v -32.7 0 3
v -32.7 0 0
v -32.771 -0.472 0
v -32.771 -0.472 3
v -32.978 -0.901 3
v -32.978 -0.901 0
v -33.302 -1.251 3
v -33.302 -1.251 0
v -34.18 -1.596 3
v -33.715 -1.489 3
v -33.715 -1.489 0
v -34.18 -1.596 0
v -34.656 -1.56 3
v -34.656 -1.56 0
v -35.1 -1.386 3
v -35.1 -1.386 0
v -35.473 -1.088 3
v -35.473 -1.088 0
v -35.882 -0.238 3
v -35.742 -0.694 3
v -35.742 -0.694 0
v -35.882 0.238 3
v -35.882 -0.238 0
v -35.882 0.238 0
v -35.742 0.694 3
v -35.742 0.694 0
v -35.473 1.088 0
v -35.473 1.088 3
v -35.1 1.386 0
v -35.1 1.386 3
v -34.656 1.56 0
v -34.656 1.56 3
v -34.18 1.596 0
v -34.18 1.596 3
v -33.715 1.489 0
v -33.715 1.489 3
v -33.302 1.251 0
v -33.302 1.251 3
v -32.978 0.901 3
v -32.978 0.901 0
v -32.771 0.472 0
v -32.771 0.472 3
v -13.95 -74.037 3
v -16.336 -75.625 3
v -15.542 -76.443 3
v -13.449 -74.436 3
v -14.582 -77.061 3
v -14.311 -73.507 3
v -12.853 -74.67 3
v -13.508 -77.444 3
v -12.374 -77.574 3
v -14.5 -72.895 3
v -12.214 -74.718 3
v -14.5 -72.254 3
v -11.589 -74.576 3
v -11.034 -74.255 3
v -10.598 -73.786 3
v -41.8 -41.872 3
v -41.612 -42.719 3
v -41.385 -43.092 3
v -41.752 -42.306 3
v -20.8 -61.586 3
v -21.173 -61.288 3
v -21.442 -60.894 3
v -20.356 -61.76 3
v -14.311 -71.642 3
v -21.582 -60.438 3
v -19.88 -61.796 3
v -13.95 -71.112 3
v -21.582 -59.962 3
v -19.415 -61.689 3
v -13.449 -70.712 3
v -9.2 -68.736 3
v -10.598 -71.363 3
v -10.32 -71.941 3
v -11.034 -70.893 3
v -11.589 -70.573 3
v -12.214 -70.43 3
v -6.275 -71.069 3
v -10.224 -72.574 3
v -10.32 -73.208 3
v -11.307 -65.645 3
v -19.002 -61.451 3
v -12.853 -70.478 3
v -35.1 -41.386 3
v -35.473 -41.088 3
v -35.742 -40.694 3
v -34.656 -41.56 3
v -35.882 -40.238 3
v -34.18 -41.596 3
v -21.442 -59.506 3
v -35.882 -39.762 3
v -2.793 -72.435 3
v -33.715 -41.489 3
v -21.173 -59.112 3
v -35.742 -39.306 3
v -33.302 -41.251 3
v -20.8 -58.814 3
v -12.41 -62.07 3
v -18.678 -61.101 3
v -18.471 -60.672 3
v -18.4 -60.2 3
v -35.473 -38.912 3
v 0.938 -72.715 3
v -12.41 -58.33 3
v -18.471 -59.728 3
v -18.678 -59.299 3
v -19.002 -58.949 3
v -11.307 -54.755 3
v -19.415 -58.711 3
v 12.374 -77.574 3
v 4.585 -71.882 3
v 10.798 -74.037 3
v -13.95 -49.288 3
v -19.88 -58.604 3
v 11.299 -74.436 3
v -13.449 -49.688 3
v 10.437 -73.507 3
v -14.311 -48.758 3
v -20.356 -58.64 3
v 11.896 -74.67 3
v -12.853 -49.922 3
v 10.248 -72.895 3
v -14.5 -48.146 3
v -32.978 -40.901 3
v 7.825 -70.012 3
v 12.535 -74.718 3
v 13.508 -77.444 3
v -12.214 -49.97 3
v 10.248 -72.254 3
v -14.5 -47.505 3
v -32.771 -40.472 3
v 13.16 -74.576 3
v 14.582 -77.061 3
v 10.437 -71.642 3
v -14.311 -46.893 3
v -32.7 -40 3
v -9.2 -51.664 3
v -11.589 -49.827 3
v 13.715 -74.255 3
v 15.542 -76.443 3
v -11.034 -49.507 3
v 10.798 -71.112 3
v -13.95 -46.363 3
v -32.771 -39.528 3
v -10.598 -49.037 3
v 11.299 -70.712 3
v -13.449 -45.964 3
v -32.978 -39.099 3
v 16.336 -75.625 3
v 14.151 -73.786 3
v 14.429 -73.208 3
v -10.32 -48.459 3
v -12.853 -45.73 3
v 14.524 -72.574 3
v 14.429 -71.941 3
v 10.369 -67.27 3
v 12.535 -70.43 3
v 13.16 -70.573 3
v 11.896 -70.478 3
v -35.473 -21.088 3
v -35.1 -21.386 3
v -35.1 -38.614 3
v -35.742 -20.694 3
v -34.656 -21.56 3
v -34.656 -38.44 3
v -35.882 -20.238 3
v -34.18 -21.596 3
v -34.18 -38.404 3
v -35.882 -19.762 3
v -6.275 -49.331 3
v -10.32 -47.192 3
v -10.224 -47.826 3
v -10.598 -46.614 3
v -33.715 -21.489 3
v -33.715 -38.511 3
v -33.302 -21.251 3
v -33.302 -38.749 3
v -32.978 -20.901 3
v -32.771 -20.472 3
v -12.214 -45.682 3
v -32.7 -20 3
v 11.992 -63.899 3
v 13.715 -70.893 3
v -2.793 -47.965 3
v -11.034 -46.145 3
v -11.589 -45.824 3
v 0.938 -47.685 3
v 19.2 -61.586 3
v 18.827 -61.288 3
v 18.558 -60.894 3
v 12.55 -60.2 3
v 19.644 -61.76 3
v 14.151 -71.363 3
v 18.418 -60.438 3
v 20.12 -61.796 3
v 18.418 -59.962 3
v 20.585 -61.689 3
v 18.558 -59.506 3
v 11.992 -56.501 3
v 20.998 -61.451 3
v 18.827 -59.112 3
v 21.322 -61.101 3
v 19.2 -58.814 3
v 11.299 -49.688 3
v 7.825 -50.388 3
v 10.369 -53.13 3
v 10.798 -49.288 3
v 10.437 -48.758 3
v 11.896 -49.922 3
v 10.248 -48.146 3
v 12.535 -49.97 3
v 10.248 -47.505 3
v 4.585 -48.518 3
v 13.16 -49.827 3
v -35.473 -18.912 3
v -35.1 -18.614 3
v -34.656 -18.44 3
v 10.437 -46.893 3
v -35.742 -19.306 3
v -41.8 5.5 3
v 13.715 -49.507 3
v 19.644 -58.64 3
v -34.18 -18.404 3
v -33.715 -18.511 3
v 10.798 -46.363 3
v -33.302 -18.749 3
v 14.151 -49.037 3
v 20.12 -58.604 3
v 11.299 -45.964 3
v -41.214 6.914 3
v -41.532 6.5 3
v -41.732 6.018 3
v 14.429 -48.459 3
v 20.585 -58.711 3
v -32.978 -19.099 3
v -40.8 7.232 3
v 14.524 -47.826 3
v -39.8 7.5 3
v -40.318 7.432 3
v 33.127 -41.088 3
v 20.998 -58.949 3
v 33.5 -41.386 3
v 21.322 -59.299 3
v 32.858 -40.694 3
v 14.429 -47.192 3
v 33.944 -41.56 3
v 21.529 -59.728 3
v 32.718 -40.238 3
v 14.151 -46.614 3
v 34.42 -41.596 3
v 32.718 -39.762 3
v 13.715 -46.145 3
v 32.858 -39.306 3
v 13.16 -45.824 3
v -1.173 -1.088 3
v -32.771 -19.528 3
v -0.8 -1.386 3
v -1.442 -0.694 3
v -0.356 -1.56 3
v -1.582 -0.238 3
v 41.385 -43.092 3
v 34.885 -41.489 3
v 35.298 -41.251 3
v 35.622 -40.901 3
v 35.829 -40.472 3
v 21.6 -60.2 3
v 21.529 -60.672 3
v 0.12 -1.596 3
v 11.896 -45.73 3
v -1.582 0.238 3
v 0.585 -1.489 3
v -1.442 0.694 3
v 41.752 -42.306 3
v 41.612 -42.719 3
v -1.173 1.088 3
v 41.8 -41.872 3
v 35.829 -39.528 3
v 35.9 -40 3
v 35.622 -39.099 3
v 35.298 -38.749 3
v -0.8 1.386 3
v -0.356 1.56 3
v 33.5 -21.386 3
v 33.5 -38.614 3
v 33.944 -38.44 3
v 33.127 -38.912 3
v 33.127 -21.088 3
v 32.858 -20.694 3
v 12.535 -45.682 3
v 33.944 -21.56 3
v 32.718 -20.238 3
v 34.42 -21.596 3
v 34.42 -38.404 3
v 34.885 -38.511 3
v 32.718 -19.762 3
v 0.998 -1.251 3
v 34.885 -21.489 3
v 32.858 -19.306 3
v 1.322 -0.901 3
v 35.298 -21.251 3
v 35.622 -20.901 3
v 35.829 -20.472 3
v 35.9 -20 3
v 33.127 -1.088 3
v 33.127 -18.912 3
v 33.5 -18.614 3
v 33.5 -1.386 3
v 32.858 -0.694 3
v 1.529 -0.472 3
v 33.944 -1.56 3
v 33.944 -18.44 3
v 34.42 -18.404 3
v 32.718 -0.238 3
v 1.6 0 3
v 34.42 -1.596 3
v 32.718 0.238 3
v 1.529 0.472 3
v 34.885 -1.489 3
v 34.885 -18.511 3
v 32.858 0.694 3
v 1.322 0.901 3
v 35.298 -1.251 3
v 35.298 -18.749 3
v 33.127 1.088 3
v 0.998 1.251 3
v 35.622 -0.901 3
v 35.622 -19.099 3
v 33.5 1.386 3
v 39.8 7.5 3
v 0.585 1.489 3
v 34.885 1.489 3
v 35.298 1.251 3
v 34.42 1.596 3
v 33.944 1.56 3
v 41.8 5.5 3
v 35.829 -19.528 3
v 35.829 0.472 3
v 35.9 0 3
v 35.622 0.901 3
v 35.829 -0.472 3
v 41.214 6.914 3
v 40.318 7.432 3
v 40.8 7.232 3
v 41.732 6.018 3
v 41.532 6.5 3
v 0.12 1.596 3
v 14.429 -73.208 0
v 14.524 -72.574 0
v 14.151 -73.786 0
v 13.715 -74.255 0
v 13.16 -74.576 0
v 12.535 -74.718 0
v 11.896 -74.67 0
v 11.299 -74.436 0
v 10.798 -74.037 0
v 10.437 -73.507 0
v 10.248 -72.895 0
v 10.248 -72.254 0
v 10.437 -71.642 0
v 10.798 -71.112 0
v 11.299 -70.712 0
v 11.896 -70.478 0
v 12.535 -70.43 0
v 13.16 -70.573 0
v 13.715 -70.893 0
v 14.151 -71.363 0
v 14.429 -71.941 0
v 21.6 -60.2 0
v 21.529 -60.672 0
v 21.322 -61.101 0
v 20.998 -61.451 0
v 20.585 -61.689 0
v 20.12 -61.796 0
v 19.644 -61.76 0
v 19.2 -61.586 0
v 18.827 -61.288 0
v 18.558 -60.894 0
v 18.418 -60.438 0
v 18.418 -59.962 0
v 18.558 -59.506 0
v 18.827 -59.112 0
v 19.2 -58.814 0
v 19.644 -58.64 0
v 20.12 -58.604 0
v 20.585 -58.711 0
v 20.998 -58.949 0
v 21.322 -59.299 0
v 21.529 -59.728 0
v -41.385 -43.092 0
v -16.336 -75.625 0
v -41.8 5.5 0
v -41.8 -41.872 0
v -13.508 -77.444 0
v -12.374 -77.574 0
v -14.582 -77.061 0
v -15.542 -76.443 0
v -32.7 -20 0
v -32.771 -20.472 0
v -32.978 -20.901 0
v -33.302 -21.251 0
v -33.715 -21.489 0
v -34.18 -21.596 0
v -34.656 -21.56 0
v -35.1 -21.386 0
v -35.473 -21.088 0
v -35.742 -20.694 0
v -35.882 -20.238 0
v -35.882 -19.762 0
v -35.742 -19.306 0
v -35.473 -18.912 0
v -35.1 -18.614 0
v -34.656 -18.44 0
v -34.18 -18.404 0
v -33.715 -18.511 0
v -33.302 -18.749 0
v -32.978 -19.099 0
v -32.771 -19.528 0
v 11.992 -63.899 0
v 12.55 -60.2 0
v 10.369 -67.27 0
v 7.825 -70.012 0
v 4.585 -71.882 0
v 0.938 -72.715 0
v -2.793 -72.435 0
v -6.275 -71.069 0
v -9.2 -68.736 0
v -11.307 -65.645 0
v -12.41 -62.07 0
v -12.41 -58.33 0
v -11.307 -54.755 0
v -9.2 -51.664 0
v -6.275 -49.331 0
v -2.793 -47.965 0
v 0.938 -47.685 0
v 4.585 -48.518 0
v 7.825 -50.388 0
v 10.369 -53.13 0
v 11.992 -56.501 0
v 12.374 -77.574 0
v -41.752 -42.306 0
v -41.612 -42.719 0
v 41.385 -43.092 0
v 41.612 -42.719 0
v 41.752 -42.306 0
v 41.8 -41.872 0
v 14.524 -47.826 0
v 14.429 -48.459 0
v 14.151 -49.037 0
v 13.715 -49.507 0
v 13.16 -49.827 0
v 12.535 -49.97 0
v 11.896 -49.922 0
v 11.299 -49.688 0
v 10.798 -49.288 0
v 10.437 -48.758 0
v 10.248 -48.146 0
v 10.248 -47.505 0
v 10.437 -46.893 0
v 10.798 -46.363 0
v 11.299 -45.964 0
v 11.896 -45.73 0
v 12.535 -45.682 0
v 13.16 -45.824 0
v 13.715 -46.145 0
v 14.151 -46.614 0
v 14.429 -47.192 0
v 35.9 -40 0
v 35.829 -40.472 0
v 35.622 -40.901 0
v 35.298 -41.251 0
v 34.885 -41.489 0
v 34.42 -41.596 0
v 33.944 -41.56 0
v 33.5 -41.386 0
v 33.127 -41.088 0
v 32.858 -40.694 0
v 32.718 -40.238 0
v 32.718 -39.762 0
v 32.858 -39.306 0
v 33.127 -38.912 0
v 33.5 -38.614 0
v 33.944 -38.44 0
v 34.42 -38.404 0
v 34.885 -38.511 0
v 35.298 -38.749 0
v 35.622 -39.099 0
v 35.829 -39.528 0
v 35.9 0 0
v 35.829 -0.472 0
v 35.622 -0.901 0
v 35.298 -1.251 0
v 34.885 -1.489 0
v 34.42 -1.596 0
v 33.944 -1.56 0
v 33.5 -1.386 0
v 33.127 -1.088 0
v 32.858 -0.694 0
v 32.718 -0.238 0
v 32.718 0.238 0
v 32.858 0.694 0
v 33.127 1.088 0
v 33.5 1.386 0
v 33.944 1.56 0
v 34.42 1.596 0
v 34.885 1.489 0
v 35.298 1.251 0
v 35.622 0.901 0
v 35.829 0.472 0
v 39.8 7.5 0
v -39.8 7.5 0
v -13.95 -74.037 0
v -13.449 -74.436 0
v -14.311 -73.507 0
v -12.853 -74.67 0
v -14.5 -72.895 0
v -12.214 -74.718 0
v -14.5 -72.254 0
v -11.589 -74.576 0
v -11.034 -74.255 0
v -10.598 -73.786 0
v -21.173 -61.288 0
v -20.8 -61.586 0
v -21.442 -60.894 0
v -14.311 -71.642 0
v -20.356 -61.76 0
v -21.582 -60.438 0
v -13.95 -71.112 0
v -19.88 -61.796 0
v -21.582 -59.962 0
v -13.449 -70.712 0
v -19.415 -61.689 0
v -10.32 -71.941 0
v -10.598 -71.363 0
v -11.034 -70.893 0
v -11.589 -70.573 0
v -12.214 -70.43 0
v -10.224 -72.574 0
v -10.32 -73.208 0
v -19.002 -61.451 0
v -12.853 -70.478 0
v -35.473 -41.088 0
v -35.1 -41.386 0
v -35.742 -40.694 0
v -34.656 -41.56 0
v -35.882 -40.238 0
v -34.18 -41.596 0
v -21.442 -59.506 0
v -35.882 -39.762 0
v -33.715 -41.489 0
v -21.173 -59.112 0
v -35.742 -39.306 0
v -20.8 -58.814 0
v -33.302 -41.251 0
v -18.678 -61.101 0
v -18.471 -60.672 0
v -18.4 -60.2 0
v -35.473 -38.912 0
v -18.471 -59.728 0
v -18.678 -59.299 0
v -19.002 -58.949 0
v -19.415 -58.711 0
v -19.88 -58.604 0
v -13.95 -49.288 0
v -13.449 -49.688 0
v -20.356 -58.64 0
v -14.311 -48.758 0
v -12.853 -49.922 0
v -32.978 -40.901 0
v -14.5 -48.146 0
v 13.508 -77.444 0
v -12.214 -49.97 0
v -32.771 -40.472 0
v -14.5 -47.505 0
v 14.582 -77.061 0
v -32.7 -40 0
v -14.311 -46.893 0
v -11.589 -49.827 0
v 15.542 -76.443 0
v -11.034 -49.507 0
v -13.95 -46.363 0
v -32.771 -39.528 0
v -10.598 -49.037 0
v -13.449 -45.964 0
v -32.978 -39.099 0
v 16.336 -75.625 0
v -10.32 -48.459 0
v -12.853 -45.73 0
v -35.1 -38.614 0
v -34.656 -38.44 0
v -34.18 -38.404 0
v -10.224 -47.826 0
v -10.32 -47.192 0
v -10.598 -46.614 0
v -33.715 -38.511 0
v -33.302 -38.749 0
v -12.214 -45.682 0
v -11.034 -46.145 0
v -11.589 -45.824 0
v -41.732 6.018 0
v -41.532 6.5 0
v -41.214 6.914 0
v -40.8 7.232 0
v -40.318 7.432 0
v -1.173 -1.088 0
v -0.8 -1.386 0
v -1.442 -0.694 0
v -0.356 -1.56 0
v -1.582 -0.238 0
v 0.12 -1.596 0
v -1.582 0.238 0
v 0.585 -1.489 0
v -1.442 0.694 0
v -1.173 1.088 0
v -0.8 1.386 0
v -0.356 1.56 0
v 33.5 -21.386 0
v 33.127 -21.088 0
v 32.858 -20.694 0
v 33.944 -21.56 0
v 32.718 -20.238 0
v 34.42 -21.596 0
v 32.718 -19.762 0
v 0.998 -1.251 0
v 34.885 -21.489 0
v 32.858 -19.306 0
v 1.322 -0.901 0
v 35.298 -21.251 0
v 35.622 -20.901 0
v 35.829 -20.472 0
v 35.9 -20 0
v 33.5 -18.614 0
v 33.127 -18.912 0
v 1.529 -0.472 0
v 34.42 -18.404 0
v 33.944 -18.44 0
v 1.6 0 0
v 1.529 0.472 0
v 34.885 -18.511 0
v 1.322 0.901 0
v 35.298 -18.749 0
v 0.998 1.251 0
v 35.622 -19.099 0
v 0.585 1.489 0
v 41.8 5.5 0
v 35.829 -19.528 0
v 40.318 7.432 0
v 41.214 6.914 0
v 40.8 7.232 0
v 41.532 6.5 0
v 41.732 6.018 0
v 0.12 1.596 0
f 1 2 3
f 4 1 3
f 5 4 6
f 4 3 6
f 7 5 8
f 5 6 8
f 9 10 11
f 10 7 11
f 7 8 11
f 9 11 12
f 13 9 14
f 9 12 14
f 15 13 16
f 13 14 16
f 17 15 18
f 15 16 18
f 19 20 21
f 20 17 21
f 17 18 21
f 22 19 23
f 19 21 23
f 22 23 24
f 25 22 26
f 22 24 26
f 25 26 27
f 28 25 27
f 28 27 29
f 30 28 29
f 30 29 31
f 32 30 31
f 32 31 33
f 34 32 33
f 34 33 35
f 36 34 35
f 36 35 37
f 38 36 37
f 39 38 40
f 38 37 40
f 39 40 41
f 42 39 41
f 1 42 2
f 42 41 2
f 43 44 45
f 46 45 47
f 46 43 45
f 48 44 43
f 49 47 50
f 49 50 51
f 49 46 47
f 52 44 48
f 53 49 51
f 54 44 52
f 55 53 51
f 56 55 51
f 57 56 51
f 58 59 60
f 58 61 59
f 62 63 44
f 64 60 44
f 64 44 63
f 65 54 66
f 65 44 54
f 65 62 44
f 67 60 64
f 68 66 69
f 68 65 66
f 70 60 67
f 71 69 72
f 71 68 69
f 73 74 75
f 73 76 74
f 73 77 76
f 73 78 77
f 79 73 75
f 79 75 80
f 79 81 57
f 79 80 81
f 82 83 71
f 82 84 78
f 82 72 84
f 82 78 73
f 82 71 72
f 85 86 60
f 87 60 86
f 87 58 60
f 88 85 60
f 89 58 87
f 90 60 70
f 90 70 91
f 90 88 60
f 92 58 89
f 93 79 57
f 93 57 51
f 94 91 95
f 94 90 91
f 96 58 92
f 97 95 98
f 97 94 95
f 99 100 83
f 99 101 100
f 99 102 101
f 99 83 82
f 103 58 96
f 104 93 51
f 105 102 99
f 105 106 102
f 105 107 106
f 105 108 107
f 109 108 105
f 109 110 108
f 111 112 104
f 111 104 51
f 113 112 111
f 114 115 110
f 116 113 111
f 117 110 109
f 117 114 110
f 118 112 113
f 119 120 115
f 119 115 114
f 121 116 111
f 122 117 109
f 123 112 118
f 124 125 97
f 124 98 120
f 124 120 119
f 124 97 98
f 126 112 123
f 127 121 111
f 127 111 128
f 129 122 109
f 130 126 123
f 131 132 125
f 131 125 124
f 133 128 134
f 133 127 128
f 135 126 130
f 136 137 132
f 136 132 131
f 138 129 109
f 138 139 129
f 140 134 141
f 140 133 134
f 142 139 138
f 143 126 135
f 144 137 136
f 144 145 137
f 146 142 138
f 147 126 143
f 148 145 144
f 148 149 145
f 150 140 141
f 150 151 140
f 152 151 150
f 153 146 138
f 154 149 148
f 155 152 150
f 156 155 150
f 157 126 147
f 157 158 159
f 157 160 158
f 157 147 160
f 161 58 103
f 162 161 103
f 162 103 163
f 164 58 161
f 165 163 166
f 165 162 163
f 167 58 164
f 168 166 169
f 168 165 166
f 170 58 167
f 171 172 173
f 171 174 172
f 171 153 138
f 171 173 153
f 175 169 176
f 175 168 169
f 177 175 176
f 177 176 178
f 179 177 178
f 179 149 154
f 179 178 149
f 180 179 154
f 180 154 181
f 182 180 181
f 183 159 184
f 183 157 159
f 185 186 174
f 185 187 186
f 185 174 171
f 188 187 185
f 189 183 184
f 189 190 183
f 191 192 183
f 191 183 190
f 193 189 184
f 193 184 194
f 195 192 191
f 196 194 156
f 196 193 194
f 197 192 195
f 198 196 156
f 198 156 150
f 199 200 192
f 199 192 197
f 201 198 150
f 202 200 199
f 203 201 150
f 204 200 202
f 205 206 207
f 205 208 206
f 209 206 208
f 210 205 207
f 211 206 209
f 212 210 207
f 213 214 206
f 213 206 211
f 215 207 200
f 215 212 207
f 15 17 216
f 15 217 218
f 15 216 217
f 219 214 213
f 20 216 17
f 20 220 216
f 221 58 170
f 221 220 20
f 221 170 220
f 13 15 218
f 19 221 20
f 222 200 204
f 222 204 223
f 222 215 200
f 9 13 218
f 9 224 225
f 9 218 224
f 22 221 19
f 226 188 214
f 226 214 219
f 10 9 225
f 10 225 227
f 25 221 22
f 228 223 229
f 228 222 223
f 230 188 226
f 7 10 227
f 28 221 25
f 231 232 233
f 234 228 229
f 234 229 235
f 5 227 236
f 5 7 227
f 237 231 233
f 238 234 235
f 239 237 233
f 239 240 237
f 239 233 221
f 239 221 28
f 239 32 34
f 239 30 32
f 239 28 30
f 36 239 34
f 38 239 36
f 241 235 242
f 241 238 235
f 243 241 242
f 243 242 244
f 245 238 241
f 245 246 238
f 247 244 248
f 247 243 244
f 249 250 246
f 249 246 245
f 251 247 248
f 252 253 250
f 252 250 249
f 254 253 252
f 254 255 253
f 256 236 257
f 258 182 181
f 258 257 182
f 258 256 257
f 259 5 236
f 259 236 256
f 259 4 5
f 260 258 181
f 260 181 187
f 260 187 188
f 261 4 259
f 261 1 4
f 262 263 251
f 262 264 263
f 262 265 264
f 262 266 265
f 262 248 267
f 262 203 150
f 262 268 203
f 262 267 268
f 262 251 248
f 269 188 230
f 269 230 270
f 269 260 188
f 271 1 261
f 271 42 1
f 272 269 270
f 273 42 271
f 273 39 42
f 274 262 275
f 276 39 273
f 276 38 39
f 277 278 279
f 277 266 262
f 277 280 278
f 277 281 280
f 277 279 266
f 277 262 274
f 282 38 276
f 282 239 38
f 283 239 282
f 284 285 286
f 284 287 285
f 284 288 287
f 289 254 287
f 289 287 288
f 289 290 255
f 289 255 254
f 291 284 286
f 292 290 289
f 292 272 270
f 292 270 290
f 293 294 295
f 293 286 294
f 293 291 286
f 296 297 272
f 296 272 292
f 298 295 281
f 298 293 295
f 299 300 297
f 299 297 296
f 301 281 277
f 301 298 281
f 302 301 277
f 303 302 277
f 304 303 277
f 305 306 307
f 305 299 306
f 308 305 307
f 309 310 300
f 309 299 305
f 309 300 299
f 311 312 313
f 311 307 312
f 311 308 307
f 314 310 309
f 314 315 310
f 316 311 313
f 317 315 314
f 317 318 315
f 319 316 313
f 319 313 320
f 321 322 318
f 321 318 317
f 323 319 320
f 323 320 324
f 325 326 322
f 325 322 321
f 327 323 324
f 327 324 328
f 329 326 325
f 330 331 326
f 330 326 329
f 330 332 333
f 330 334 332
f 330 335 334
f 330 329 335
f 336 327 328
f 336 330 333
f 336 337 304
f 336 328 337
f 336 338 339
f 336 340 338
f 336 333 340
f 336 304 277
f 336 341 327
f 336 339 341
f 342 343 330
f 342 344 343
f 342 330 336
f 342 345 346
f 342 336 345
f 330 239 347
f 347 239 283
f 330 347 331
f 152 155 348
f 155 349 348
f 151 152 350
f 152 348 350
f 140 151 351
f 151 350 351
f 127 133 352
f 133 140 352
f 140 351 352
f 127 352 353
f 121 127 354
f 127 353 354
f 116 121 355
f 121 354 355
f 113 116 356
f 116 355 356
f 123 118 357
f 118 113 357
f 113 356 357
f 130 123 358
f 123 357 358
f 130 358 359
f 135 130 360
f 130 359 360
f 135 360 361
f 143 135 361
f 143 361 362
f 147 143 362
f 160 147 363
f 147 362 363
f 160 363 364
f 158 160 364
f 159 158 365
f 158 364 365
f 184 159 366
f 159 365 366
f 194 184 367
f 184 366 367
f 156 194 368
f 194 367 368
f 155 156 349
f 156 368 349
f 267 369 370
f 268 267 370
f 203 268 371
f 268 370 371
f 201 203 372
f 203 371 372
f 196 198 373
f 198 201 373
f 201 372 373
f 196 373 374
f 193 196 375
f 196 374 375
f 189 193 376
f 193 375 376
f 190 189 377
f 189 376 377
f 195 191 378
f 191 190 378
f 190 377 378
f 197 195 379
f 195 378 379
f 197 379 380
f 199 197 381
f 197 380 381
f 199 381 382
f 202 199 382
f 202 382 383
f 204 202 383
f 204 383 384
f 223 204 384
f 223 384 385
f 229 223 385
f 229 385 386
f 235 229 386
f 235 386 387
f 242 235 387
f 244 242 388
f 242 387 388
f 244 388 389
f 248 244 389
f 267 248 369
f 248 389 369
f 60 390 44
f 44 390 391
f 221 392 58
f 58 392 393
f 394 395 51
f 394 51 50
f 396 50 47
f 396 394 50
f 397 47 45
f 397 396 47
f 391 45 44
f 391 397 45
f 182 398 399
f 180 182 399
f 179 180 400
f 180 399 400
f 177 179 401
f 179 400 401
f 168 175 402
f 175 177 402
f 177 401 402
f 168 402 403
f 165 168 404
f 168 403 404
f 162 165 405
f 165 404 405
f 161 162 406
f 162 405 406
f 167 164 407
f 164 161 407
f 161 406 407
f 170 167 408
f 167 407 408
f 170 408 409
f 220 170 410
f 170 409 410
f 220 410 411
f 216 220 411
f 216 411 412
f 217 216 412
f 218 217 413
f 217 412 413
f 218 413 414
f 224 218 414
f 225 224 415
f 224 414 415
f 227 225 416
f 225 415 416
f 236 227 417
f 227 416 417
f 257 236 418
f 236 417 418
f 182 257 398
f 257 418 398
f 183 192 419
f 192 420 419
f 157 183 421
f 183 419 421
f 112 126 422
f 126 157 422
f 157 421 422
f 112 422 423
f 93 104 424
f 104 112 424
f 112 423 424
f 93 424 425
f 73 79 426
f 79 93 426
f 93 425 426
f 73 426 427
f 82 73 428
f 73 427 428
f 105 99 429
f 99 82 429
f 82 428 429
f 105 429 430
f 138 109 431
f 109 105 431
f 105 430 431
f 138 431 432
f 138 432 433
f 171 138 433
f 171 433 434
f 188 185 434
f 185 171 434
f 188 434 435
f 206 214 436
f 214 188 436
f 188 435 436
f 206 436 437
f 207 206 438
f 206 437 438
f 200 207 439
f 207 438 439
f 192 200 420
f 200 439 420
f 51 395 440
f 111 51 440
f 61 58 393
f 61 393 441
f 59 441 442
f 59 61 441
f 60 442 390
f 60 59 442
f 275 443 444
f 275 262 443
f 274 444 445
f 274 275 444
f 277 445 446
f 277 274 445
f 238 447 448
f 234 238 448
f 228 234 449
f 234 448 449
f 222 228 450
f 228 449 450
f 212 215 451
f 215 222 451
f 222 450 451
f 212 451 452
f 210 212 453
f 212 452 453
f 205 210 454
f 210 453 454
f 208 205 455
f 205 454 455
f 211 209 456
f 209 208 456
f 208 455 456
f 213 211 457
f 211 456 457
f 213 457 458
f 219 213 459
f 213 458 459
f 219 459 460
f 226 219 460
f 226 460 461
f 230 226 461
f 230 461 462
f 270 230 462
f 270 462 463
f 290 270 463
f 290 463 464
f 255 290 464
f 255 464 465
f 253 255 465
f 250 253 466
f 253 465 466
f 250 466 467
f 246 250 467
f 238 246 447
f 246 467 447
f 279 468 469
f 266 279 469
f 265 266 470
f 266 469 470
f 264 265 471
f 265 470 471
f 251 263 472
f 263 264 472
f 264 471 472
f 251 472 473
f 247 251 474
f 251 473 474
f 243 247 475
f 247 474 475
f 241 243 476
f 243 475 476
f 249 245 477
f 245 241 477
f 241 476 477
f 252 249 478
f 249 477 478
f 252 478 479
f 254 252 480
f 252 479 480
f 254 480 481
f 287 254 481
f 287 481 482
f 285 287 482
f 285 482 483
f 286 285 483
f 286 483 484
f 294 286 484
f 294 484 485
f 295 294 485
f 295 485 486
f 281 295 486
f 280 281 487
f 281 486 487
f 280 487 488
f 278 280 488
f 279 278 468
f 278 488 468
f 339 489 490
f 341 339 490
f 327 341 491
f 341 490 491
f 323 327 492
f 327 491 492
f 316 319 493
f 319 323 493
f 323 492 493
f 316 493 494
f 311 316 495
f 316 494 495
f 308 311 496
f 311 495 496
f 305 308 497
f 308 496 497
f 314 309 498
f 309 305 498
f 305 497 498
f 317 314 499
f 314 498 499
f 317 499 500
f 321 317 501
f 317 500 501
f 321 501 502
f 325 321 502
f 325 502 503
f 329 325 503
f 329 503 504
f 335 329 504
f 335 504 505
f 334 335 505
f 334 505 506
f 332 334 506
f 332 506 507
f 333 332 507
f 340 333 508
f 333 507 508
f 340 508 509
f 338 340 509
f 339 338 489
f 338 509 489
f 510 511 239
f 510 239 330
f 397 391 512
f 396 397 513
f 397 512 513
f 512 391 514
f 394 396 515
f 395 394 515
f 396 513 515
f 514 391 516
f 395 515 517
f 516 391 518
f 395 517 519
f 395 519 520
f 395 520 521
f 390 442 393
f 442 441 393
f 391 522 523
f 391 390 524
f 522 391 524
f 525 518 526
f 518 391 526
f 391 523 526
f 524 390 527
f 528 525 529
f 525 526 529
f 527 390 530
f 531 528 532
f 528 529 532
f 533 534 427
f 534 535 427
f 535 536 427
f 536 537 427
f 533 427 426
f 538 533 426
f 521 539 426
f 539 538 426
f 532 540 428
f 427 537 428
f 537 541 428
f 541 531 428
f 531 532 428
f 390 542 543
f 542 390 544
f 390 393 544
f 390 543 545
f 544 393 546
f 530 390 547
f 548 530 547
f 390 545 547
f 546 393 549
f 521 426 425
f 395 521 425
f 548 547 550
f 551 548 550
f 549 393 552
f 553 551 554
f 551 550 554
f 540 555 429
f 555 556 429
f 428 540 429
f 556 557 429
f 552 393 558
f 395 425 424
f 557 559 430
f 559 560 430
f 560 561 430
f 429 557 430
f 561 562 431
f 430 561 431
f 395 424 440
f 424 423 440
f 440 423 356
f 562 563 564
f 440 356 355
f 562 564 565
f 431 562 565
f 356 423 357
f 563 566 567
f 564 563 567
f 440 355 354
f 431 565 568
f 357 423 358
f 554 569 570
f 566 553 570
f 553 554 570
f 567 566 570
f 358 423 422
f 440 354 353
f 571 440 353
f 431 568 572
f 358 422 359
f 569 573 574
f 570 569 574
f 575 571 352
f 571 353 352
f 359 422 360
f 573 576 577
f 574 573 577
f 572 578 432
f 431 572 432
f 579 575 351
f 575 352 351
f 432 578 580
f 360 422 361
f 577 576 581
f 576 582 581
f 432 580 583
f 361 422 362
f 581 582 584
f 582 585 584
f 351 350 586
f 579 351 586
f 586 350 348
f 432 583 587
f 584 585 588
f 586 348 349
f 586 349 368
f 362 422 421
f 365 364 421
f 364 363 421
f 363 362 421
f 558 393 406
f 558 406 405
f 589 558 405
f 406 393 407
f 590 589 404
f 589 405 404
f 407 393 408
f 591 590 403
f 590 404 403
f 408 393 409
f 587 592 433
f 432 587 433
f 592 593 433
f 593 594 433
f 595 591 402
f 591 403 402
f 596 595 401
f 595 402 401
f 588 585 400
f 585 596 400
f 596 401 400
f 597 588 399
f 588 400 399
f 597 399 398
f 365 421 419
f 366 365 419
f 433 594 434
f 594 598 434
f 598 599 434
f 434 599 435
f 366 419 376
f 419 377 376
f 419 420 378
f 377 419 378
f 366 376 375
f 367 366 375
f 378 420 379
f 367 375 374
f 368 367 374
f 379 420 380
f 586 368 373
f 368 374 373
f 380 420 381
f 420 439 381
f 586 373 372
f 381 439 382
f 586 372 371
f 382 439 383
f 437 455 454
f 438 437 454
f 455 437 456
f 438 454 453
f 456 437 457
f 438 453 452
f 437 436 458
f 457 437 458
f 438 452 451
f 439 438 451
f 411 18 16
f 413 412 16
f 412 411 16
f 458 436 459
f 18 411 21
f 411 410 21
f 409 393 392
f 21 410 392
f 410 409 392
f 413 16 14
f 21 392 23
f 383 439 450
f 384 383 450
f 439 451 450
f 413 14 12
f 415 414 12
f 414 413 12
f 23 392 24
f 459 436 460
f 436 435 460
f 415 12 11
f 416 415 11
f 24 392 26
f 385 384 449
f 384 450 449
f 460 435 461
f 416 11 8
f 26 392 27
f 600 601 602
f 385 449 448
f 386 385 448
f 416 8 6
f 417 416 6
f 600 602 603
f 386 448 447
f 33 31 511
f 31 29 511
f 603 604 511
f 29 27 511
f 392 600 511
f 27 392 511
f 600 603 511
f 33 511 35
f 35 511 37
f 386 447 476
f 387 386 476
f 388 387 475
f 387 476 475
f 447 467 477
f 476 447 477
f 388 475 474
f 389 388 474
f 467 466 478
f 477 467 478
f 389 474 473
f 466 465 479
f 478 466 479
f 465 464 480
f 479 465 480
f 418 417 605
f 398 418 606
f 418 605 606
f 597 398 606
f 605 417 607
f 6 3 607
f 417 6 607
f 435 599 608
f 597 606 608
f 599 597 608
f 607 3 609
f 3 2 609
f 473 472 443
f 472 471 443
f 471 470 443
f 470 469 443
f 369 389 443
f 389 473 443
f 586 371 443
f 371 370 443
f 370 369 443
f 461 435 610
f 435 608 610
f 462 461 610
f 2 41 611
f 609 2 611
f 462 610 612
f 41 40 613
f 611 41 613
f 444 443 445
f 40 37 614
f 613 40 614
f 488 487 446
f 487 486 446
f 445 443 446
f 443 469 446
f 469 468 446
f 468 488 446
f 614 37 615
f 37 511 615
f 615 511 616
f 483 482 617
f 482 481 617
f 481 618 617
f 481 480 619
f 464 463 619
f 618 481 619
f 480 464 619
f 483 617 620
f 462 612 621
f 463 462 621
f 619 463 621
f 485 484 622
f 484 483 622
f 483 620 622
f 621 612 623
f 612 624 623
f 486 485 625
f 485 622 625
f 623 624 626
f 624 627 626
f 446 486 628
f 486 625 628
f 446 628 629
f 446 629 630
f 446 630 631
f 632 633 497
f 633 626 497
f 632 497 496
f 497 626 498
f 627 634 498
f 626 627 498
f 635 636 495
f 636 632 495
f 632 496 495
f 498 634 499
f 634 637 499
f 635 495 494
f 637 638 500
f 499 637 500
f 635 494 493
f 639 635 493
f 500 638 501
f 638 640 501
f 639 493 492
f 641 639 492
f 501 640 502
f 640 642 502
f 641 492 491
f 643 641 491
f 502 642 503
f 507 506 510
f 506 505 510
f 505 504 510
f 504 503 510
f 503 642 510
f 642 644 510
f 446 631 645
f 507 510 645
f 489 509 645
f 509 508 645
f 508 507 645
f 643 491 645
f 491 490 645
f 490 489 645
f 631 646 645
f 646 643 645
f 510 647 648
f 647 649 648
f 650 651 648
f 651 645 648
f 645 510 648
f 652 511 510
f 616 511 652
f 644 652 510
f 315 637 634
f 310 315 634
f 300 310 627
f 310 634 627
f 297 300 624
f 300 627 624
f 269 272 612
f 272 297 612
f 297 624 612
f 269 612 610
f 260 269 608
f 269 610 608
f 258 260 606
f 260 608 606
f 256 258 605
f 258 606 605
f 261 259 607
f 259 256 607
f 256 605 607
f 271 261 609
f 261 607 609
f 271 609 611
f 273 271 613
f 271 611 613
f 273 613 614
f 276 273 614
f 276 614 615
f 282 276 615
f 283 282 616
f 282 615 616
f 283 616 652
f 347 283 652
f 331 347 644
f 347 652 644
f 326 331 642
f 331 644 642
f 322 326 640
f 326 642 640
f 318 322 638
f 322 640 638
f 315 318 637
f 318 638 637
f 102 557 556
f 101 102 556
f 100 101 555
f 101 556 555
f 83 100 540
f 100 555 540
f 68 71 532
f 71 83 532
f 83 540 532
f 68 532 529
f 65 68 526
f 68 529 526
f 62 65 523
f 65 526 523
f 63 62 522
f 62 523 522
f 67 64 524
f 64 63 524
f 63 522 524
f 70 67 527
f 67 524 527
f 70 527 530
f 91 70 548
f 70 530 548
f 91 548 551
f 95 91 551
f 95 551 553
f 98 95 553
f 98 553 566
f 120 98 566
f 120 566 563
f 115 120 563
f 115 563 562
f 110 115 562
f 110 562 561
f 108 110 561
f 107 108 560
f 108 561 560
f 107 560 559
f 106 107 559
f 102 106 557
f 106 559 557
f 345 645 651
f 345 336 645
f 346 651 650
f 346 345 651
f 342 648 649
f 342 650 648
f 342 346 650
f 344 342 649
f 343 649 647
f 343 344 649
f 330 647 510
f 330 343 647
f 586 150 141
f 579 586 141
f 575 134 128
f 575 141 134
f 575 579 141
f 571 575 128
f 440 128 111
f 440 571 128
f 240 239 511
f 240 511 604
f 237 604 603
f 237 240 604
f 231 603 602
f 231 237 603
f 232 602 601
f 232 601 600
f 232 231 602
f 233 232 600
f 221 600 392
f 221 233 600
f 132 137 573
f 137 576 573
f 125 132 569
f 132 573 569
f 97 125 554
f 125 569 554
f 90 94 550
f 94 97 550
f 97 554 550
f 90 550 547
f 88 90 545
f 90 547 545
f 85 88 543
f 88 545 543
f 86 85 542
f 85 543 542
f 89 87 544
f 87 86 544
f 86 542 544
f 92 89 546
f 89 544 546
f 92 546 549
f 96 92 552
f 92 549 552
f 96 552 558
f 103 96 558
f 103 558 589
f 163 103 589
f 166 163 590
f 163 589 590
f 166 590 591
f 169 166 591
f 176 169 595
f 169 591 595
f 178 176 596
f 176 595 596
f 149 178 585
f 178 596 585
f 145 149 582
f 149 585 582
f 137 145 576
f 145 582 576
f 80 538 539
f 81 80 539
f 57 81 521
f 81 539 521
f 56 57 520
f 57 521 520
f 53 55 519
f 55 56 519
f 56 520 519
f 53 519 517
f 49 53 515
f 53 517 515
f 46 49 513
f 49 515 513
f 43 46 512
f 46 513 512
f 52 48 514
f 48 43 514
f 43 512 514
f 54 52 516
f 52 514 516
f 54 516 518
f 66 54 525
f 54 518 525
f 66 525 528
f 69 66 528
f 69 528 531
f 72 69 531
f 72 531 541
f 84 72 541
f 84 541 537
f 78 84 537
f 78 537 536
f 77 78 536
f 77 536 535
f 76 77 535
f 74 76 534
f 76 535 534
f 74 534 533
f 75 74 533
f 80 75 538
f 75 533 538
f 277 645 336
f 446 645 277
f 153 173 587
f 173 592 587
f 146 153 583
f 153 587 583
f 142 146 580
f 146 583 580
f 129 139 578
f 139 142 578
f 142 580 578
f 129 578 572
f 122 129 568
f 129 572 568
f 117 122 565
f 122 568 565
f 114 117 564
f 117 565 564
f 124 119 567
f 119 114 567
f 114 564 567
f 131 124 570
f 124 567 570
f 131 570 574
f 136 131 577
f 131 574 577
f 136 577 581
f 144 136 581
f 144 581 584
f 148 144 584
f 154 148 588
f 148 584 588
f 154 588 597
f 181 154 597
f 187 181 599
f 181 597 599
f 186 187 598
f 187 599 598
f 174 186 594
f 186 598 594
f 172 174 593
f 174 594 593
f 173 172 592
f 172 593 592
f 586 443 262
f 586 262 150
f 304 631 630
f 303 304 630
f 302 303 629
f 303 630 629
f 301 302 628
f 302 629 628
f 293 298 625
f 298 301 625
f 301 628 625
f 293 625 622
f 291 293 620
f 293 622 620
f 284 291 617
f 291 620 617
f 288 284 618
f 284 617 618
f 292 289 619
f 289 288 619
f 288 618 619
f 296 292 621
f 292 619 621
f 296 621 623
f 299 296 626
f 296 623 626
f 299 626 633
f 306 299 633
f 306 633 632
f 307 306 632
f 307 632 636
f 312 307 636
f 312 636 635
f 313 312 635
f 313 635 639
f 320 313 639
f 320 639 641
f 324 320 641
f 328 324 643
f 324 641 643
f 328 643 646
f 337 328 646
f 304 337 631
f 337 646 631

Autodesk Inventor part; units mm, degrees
ref_plane "YZ Plane" through (0, 0, 0) normal (1, 0, 0) x (0, 1, 0)
ref_plane "XZ Plane" through (0, 0, 0) normal (0, 1, 0) x (-1, 0, 0)
ref_plane "XY Plane" through (0, 0, 0) normal (0, 0, 1) x (1, 0, 0)
sketch "スケッチ1" plane through (0, 0, 0) normal (0, 0, 1) x (1, 0, 0)
  circle A0 centre (-34.3, -20) radius 1.6
  circle A1 centre (-34.3, 0) radius 1.6
  circle A2 centre (-34.3, -40) radius 1.6
  circle A3 centre (34.3, -20) radius 1.6
  circle A4 centre (34.3, 0) radius 1.6
  circle A5 centre (34.3, -40) radius 1.6
  circle A6 centre (0, 0) radius 1.6
  circle A7 centre (0, 0) radius 50 construction
  circle A8 centre (0, -60.2) radius 10 construction
  circle A9 centre (0, -60.2) radius 12.55
  circle A10 centre (-12.3744, -47.8256) radius 2.15
  circle A11 centre (-12.3744, -72.5744) radius 2.15
  circle A12 centre (12.3744, -72.5744) radius 2.15
  circle A13 centre (12.3744, -47.8256) radius 2.15
  line L0 (12.3744, -47.8256) -> (-12.3744, -47.8256) construction
  line L1 (-12.3744, -47.8256) -> (-12.3744, -72.5744) construction
  line L2 (-12.3744, -72.5744) -> (12.3744, -72.5744) construction
  line L3 (12.3744, -72.5744) -> (12.3744, -47.8256) construction
  line L4 (12.3744, -47.8256) -> (-12.3744, -72.5744) construction
  line L5 (-12.3744, -47.8256) -> (12.3744, -72.5744) construction
  line L6 (-41.8, 7.5) -> (41.8, 7.5)
  line L7 (41.8, 7.5) -> (41.8, -42.5528)
  line L8 (41.8, -42.5528) -> (16.3361, -75.6247)
  line L9 (-41.8, 7.5) -> (-41.8, -42.5528)
  line L10 (-41.8, -42.5528) -> (-16.3361, -75.6247)
  arc A14 (-16.3361, -75.6247) -> (-12.3744, -77.5744) centre (-12.3744, -72.5744) ccw
  arc A15 (12.3744, -77.5744) -> (16.3361, -75.6247) centre (12.3744, -72.5744) ccw
  line L11 (-12.3744, -77.5744) -> (12.3744, -77.5744)
  circle A16 centre (20, -60.2) radius 1.6
  circle A17 centre (-20, -60.2) radius 1.6
  dimension "d0" = 3.2
  dimension "d1" = 3.2
  dimension "d2" = 3.2
  dimension "d3" = 20
  dimension "d4" = 20
  dimension "d5" = 3.2
  dimension "d6" = 3.2
  dimension "d7" = 3.2
  dimension "d8" = 20
  dimension "d9" = 20
  dimension "d10" = 68.6
  dimension "d11" = 34.3
  dimension "d12" = 3.2
  dimension "d13" = 100
  dimension "d14" = 20
  dimension "d15" = 60.2
  dimension "d16" = 25.1
  dimension "d17" = 4.3
  dimension "d18" = 4.3
  dimension "d19" = 4.3
  dimension "d20" = 4.3
  dimension "d21" = 35
  dimension "d22" = 5
  dimension "d23" = 7.5
  dimension "d24" = 7.5
  dimension "d25" = 7.5
  dimension "d26" = 7.5
  dimension "d27" = 7.5
  dimension "d31" = 3.2
  dimension "d32" = 3.2
  dimension "d33" = 40
  dimension "d34" = 20
extrude "押し出し1" add sketch "スケッチ1" along normal blind 3
fillet "フィレット1" radius 2 4 edges at (-41.8, 7.5, 1.5) (41.8, 7.5, 1.5) (41.8, -42.5528, 1.5) (-41.8, -42.5528, 1.5)
equation "\"d11\" = 0.5 * d10"
properties part number "関節4_側板" material "アルミニウム 6061"
